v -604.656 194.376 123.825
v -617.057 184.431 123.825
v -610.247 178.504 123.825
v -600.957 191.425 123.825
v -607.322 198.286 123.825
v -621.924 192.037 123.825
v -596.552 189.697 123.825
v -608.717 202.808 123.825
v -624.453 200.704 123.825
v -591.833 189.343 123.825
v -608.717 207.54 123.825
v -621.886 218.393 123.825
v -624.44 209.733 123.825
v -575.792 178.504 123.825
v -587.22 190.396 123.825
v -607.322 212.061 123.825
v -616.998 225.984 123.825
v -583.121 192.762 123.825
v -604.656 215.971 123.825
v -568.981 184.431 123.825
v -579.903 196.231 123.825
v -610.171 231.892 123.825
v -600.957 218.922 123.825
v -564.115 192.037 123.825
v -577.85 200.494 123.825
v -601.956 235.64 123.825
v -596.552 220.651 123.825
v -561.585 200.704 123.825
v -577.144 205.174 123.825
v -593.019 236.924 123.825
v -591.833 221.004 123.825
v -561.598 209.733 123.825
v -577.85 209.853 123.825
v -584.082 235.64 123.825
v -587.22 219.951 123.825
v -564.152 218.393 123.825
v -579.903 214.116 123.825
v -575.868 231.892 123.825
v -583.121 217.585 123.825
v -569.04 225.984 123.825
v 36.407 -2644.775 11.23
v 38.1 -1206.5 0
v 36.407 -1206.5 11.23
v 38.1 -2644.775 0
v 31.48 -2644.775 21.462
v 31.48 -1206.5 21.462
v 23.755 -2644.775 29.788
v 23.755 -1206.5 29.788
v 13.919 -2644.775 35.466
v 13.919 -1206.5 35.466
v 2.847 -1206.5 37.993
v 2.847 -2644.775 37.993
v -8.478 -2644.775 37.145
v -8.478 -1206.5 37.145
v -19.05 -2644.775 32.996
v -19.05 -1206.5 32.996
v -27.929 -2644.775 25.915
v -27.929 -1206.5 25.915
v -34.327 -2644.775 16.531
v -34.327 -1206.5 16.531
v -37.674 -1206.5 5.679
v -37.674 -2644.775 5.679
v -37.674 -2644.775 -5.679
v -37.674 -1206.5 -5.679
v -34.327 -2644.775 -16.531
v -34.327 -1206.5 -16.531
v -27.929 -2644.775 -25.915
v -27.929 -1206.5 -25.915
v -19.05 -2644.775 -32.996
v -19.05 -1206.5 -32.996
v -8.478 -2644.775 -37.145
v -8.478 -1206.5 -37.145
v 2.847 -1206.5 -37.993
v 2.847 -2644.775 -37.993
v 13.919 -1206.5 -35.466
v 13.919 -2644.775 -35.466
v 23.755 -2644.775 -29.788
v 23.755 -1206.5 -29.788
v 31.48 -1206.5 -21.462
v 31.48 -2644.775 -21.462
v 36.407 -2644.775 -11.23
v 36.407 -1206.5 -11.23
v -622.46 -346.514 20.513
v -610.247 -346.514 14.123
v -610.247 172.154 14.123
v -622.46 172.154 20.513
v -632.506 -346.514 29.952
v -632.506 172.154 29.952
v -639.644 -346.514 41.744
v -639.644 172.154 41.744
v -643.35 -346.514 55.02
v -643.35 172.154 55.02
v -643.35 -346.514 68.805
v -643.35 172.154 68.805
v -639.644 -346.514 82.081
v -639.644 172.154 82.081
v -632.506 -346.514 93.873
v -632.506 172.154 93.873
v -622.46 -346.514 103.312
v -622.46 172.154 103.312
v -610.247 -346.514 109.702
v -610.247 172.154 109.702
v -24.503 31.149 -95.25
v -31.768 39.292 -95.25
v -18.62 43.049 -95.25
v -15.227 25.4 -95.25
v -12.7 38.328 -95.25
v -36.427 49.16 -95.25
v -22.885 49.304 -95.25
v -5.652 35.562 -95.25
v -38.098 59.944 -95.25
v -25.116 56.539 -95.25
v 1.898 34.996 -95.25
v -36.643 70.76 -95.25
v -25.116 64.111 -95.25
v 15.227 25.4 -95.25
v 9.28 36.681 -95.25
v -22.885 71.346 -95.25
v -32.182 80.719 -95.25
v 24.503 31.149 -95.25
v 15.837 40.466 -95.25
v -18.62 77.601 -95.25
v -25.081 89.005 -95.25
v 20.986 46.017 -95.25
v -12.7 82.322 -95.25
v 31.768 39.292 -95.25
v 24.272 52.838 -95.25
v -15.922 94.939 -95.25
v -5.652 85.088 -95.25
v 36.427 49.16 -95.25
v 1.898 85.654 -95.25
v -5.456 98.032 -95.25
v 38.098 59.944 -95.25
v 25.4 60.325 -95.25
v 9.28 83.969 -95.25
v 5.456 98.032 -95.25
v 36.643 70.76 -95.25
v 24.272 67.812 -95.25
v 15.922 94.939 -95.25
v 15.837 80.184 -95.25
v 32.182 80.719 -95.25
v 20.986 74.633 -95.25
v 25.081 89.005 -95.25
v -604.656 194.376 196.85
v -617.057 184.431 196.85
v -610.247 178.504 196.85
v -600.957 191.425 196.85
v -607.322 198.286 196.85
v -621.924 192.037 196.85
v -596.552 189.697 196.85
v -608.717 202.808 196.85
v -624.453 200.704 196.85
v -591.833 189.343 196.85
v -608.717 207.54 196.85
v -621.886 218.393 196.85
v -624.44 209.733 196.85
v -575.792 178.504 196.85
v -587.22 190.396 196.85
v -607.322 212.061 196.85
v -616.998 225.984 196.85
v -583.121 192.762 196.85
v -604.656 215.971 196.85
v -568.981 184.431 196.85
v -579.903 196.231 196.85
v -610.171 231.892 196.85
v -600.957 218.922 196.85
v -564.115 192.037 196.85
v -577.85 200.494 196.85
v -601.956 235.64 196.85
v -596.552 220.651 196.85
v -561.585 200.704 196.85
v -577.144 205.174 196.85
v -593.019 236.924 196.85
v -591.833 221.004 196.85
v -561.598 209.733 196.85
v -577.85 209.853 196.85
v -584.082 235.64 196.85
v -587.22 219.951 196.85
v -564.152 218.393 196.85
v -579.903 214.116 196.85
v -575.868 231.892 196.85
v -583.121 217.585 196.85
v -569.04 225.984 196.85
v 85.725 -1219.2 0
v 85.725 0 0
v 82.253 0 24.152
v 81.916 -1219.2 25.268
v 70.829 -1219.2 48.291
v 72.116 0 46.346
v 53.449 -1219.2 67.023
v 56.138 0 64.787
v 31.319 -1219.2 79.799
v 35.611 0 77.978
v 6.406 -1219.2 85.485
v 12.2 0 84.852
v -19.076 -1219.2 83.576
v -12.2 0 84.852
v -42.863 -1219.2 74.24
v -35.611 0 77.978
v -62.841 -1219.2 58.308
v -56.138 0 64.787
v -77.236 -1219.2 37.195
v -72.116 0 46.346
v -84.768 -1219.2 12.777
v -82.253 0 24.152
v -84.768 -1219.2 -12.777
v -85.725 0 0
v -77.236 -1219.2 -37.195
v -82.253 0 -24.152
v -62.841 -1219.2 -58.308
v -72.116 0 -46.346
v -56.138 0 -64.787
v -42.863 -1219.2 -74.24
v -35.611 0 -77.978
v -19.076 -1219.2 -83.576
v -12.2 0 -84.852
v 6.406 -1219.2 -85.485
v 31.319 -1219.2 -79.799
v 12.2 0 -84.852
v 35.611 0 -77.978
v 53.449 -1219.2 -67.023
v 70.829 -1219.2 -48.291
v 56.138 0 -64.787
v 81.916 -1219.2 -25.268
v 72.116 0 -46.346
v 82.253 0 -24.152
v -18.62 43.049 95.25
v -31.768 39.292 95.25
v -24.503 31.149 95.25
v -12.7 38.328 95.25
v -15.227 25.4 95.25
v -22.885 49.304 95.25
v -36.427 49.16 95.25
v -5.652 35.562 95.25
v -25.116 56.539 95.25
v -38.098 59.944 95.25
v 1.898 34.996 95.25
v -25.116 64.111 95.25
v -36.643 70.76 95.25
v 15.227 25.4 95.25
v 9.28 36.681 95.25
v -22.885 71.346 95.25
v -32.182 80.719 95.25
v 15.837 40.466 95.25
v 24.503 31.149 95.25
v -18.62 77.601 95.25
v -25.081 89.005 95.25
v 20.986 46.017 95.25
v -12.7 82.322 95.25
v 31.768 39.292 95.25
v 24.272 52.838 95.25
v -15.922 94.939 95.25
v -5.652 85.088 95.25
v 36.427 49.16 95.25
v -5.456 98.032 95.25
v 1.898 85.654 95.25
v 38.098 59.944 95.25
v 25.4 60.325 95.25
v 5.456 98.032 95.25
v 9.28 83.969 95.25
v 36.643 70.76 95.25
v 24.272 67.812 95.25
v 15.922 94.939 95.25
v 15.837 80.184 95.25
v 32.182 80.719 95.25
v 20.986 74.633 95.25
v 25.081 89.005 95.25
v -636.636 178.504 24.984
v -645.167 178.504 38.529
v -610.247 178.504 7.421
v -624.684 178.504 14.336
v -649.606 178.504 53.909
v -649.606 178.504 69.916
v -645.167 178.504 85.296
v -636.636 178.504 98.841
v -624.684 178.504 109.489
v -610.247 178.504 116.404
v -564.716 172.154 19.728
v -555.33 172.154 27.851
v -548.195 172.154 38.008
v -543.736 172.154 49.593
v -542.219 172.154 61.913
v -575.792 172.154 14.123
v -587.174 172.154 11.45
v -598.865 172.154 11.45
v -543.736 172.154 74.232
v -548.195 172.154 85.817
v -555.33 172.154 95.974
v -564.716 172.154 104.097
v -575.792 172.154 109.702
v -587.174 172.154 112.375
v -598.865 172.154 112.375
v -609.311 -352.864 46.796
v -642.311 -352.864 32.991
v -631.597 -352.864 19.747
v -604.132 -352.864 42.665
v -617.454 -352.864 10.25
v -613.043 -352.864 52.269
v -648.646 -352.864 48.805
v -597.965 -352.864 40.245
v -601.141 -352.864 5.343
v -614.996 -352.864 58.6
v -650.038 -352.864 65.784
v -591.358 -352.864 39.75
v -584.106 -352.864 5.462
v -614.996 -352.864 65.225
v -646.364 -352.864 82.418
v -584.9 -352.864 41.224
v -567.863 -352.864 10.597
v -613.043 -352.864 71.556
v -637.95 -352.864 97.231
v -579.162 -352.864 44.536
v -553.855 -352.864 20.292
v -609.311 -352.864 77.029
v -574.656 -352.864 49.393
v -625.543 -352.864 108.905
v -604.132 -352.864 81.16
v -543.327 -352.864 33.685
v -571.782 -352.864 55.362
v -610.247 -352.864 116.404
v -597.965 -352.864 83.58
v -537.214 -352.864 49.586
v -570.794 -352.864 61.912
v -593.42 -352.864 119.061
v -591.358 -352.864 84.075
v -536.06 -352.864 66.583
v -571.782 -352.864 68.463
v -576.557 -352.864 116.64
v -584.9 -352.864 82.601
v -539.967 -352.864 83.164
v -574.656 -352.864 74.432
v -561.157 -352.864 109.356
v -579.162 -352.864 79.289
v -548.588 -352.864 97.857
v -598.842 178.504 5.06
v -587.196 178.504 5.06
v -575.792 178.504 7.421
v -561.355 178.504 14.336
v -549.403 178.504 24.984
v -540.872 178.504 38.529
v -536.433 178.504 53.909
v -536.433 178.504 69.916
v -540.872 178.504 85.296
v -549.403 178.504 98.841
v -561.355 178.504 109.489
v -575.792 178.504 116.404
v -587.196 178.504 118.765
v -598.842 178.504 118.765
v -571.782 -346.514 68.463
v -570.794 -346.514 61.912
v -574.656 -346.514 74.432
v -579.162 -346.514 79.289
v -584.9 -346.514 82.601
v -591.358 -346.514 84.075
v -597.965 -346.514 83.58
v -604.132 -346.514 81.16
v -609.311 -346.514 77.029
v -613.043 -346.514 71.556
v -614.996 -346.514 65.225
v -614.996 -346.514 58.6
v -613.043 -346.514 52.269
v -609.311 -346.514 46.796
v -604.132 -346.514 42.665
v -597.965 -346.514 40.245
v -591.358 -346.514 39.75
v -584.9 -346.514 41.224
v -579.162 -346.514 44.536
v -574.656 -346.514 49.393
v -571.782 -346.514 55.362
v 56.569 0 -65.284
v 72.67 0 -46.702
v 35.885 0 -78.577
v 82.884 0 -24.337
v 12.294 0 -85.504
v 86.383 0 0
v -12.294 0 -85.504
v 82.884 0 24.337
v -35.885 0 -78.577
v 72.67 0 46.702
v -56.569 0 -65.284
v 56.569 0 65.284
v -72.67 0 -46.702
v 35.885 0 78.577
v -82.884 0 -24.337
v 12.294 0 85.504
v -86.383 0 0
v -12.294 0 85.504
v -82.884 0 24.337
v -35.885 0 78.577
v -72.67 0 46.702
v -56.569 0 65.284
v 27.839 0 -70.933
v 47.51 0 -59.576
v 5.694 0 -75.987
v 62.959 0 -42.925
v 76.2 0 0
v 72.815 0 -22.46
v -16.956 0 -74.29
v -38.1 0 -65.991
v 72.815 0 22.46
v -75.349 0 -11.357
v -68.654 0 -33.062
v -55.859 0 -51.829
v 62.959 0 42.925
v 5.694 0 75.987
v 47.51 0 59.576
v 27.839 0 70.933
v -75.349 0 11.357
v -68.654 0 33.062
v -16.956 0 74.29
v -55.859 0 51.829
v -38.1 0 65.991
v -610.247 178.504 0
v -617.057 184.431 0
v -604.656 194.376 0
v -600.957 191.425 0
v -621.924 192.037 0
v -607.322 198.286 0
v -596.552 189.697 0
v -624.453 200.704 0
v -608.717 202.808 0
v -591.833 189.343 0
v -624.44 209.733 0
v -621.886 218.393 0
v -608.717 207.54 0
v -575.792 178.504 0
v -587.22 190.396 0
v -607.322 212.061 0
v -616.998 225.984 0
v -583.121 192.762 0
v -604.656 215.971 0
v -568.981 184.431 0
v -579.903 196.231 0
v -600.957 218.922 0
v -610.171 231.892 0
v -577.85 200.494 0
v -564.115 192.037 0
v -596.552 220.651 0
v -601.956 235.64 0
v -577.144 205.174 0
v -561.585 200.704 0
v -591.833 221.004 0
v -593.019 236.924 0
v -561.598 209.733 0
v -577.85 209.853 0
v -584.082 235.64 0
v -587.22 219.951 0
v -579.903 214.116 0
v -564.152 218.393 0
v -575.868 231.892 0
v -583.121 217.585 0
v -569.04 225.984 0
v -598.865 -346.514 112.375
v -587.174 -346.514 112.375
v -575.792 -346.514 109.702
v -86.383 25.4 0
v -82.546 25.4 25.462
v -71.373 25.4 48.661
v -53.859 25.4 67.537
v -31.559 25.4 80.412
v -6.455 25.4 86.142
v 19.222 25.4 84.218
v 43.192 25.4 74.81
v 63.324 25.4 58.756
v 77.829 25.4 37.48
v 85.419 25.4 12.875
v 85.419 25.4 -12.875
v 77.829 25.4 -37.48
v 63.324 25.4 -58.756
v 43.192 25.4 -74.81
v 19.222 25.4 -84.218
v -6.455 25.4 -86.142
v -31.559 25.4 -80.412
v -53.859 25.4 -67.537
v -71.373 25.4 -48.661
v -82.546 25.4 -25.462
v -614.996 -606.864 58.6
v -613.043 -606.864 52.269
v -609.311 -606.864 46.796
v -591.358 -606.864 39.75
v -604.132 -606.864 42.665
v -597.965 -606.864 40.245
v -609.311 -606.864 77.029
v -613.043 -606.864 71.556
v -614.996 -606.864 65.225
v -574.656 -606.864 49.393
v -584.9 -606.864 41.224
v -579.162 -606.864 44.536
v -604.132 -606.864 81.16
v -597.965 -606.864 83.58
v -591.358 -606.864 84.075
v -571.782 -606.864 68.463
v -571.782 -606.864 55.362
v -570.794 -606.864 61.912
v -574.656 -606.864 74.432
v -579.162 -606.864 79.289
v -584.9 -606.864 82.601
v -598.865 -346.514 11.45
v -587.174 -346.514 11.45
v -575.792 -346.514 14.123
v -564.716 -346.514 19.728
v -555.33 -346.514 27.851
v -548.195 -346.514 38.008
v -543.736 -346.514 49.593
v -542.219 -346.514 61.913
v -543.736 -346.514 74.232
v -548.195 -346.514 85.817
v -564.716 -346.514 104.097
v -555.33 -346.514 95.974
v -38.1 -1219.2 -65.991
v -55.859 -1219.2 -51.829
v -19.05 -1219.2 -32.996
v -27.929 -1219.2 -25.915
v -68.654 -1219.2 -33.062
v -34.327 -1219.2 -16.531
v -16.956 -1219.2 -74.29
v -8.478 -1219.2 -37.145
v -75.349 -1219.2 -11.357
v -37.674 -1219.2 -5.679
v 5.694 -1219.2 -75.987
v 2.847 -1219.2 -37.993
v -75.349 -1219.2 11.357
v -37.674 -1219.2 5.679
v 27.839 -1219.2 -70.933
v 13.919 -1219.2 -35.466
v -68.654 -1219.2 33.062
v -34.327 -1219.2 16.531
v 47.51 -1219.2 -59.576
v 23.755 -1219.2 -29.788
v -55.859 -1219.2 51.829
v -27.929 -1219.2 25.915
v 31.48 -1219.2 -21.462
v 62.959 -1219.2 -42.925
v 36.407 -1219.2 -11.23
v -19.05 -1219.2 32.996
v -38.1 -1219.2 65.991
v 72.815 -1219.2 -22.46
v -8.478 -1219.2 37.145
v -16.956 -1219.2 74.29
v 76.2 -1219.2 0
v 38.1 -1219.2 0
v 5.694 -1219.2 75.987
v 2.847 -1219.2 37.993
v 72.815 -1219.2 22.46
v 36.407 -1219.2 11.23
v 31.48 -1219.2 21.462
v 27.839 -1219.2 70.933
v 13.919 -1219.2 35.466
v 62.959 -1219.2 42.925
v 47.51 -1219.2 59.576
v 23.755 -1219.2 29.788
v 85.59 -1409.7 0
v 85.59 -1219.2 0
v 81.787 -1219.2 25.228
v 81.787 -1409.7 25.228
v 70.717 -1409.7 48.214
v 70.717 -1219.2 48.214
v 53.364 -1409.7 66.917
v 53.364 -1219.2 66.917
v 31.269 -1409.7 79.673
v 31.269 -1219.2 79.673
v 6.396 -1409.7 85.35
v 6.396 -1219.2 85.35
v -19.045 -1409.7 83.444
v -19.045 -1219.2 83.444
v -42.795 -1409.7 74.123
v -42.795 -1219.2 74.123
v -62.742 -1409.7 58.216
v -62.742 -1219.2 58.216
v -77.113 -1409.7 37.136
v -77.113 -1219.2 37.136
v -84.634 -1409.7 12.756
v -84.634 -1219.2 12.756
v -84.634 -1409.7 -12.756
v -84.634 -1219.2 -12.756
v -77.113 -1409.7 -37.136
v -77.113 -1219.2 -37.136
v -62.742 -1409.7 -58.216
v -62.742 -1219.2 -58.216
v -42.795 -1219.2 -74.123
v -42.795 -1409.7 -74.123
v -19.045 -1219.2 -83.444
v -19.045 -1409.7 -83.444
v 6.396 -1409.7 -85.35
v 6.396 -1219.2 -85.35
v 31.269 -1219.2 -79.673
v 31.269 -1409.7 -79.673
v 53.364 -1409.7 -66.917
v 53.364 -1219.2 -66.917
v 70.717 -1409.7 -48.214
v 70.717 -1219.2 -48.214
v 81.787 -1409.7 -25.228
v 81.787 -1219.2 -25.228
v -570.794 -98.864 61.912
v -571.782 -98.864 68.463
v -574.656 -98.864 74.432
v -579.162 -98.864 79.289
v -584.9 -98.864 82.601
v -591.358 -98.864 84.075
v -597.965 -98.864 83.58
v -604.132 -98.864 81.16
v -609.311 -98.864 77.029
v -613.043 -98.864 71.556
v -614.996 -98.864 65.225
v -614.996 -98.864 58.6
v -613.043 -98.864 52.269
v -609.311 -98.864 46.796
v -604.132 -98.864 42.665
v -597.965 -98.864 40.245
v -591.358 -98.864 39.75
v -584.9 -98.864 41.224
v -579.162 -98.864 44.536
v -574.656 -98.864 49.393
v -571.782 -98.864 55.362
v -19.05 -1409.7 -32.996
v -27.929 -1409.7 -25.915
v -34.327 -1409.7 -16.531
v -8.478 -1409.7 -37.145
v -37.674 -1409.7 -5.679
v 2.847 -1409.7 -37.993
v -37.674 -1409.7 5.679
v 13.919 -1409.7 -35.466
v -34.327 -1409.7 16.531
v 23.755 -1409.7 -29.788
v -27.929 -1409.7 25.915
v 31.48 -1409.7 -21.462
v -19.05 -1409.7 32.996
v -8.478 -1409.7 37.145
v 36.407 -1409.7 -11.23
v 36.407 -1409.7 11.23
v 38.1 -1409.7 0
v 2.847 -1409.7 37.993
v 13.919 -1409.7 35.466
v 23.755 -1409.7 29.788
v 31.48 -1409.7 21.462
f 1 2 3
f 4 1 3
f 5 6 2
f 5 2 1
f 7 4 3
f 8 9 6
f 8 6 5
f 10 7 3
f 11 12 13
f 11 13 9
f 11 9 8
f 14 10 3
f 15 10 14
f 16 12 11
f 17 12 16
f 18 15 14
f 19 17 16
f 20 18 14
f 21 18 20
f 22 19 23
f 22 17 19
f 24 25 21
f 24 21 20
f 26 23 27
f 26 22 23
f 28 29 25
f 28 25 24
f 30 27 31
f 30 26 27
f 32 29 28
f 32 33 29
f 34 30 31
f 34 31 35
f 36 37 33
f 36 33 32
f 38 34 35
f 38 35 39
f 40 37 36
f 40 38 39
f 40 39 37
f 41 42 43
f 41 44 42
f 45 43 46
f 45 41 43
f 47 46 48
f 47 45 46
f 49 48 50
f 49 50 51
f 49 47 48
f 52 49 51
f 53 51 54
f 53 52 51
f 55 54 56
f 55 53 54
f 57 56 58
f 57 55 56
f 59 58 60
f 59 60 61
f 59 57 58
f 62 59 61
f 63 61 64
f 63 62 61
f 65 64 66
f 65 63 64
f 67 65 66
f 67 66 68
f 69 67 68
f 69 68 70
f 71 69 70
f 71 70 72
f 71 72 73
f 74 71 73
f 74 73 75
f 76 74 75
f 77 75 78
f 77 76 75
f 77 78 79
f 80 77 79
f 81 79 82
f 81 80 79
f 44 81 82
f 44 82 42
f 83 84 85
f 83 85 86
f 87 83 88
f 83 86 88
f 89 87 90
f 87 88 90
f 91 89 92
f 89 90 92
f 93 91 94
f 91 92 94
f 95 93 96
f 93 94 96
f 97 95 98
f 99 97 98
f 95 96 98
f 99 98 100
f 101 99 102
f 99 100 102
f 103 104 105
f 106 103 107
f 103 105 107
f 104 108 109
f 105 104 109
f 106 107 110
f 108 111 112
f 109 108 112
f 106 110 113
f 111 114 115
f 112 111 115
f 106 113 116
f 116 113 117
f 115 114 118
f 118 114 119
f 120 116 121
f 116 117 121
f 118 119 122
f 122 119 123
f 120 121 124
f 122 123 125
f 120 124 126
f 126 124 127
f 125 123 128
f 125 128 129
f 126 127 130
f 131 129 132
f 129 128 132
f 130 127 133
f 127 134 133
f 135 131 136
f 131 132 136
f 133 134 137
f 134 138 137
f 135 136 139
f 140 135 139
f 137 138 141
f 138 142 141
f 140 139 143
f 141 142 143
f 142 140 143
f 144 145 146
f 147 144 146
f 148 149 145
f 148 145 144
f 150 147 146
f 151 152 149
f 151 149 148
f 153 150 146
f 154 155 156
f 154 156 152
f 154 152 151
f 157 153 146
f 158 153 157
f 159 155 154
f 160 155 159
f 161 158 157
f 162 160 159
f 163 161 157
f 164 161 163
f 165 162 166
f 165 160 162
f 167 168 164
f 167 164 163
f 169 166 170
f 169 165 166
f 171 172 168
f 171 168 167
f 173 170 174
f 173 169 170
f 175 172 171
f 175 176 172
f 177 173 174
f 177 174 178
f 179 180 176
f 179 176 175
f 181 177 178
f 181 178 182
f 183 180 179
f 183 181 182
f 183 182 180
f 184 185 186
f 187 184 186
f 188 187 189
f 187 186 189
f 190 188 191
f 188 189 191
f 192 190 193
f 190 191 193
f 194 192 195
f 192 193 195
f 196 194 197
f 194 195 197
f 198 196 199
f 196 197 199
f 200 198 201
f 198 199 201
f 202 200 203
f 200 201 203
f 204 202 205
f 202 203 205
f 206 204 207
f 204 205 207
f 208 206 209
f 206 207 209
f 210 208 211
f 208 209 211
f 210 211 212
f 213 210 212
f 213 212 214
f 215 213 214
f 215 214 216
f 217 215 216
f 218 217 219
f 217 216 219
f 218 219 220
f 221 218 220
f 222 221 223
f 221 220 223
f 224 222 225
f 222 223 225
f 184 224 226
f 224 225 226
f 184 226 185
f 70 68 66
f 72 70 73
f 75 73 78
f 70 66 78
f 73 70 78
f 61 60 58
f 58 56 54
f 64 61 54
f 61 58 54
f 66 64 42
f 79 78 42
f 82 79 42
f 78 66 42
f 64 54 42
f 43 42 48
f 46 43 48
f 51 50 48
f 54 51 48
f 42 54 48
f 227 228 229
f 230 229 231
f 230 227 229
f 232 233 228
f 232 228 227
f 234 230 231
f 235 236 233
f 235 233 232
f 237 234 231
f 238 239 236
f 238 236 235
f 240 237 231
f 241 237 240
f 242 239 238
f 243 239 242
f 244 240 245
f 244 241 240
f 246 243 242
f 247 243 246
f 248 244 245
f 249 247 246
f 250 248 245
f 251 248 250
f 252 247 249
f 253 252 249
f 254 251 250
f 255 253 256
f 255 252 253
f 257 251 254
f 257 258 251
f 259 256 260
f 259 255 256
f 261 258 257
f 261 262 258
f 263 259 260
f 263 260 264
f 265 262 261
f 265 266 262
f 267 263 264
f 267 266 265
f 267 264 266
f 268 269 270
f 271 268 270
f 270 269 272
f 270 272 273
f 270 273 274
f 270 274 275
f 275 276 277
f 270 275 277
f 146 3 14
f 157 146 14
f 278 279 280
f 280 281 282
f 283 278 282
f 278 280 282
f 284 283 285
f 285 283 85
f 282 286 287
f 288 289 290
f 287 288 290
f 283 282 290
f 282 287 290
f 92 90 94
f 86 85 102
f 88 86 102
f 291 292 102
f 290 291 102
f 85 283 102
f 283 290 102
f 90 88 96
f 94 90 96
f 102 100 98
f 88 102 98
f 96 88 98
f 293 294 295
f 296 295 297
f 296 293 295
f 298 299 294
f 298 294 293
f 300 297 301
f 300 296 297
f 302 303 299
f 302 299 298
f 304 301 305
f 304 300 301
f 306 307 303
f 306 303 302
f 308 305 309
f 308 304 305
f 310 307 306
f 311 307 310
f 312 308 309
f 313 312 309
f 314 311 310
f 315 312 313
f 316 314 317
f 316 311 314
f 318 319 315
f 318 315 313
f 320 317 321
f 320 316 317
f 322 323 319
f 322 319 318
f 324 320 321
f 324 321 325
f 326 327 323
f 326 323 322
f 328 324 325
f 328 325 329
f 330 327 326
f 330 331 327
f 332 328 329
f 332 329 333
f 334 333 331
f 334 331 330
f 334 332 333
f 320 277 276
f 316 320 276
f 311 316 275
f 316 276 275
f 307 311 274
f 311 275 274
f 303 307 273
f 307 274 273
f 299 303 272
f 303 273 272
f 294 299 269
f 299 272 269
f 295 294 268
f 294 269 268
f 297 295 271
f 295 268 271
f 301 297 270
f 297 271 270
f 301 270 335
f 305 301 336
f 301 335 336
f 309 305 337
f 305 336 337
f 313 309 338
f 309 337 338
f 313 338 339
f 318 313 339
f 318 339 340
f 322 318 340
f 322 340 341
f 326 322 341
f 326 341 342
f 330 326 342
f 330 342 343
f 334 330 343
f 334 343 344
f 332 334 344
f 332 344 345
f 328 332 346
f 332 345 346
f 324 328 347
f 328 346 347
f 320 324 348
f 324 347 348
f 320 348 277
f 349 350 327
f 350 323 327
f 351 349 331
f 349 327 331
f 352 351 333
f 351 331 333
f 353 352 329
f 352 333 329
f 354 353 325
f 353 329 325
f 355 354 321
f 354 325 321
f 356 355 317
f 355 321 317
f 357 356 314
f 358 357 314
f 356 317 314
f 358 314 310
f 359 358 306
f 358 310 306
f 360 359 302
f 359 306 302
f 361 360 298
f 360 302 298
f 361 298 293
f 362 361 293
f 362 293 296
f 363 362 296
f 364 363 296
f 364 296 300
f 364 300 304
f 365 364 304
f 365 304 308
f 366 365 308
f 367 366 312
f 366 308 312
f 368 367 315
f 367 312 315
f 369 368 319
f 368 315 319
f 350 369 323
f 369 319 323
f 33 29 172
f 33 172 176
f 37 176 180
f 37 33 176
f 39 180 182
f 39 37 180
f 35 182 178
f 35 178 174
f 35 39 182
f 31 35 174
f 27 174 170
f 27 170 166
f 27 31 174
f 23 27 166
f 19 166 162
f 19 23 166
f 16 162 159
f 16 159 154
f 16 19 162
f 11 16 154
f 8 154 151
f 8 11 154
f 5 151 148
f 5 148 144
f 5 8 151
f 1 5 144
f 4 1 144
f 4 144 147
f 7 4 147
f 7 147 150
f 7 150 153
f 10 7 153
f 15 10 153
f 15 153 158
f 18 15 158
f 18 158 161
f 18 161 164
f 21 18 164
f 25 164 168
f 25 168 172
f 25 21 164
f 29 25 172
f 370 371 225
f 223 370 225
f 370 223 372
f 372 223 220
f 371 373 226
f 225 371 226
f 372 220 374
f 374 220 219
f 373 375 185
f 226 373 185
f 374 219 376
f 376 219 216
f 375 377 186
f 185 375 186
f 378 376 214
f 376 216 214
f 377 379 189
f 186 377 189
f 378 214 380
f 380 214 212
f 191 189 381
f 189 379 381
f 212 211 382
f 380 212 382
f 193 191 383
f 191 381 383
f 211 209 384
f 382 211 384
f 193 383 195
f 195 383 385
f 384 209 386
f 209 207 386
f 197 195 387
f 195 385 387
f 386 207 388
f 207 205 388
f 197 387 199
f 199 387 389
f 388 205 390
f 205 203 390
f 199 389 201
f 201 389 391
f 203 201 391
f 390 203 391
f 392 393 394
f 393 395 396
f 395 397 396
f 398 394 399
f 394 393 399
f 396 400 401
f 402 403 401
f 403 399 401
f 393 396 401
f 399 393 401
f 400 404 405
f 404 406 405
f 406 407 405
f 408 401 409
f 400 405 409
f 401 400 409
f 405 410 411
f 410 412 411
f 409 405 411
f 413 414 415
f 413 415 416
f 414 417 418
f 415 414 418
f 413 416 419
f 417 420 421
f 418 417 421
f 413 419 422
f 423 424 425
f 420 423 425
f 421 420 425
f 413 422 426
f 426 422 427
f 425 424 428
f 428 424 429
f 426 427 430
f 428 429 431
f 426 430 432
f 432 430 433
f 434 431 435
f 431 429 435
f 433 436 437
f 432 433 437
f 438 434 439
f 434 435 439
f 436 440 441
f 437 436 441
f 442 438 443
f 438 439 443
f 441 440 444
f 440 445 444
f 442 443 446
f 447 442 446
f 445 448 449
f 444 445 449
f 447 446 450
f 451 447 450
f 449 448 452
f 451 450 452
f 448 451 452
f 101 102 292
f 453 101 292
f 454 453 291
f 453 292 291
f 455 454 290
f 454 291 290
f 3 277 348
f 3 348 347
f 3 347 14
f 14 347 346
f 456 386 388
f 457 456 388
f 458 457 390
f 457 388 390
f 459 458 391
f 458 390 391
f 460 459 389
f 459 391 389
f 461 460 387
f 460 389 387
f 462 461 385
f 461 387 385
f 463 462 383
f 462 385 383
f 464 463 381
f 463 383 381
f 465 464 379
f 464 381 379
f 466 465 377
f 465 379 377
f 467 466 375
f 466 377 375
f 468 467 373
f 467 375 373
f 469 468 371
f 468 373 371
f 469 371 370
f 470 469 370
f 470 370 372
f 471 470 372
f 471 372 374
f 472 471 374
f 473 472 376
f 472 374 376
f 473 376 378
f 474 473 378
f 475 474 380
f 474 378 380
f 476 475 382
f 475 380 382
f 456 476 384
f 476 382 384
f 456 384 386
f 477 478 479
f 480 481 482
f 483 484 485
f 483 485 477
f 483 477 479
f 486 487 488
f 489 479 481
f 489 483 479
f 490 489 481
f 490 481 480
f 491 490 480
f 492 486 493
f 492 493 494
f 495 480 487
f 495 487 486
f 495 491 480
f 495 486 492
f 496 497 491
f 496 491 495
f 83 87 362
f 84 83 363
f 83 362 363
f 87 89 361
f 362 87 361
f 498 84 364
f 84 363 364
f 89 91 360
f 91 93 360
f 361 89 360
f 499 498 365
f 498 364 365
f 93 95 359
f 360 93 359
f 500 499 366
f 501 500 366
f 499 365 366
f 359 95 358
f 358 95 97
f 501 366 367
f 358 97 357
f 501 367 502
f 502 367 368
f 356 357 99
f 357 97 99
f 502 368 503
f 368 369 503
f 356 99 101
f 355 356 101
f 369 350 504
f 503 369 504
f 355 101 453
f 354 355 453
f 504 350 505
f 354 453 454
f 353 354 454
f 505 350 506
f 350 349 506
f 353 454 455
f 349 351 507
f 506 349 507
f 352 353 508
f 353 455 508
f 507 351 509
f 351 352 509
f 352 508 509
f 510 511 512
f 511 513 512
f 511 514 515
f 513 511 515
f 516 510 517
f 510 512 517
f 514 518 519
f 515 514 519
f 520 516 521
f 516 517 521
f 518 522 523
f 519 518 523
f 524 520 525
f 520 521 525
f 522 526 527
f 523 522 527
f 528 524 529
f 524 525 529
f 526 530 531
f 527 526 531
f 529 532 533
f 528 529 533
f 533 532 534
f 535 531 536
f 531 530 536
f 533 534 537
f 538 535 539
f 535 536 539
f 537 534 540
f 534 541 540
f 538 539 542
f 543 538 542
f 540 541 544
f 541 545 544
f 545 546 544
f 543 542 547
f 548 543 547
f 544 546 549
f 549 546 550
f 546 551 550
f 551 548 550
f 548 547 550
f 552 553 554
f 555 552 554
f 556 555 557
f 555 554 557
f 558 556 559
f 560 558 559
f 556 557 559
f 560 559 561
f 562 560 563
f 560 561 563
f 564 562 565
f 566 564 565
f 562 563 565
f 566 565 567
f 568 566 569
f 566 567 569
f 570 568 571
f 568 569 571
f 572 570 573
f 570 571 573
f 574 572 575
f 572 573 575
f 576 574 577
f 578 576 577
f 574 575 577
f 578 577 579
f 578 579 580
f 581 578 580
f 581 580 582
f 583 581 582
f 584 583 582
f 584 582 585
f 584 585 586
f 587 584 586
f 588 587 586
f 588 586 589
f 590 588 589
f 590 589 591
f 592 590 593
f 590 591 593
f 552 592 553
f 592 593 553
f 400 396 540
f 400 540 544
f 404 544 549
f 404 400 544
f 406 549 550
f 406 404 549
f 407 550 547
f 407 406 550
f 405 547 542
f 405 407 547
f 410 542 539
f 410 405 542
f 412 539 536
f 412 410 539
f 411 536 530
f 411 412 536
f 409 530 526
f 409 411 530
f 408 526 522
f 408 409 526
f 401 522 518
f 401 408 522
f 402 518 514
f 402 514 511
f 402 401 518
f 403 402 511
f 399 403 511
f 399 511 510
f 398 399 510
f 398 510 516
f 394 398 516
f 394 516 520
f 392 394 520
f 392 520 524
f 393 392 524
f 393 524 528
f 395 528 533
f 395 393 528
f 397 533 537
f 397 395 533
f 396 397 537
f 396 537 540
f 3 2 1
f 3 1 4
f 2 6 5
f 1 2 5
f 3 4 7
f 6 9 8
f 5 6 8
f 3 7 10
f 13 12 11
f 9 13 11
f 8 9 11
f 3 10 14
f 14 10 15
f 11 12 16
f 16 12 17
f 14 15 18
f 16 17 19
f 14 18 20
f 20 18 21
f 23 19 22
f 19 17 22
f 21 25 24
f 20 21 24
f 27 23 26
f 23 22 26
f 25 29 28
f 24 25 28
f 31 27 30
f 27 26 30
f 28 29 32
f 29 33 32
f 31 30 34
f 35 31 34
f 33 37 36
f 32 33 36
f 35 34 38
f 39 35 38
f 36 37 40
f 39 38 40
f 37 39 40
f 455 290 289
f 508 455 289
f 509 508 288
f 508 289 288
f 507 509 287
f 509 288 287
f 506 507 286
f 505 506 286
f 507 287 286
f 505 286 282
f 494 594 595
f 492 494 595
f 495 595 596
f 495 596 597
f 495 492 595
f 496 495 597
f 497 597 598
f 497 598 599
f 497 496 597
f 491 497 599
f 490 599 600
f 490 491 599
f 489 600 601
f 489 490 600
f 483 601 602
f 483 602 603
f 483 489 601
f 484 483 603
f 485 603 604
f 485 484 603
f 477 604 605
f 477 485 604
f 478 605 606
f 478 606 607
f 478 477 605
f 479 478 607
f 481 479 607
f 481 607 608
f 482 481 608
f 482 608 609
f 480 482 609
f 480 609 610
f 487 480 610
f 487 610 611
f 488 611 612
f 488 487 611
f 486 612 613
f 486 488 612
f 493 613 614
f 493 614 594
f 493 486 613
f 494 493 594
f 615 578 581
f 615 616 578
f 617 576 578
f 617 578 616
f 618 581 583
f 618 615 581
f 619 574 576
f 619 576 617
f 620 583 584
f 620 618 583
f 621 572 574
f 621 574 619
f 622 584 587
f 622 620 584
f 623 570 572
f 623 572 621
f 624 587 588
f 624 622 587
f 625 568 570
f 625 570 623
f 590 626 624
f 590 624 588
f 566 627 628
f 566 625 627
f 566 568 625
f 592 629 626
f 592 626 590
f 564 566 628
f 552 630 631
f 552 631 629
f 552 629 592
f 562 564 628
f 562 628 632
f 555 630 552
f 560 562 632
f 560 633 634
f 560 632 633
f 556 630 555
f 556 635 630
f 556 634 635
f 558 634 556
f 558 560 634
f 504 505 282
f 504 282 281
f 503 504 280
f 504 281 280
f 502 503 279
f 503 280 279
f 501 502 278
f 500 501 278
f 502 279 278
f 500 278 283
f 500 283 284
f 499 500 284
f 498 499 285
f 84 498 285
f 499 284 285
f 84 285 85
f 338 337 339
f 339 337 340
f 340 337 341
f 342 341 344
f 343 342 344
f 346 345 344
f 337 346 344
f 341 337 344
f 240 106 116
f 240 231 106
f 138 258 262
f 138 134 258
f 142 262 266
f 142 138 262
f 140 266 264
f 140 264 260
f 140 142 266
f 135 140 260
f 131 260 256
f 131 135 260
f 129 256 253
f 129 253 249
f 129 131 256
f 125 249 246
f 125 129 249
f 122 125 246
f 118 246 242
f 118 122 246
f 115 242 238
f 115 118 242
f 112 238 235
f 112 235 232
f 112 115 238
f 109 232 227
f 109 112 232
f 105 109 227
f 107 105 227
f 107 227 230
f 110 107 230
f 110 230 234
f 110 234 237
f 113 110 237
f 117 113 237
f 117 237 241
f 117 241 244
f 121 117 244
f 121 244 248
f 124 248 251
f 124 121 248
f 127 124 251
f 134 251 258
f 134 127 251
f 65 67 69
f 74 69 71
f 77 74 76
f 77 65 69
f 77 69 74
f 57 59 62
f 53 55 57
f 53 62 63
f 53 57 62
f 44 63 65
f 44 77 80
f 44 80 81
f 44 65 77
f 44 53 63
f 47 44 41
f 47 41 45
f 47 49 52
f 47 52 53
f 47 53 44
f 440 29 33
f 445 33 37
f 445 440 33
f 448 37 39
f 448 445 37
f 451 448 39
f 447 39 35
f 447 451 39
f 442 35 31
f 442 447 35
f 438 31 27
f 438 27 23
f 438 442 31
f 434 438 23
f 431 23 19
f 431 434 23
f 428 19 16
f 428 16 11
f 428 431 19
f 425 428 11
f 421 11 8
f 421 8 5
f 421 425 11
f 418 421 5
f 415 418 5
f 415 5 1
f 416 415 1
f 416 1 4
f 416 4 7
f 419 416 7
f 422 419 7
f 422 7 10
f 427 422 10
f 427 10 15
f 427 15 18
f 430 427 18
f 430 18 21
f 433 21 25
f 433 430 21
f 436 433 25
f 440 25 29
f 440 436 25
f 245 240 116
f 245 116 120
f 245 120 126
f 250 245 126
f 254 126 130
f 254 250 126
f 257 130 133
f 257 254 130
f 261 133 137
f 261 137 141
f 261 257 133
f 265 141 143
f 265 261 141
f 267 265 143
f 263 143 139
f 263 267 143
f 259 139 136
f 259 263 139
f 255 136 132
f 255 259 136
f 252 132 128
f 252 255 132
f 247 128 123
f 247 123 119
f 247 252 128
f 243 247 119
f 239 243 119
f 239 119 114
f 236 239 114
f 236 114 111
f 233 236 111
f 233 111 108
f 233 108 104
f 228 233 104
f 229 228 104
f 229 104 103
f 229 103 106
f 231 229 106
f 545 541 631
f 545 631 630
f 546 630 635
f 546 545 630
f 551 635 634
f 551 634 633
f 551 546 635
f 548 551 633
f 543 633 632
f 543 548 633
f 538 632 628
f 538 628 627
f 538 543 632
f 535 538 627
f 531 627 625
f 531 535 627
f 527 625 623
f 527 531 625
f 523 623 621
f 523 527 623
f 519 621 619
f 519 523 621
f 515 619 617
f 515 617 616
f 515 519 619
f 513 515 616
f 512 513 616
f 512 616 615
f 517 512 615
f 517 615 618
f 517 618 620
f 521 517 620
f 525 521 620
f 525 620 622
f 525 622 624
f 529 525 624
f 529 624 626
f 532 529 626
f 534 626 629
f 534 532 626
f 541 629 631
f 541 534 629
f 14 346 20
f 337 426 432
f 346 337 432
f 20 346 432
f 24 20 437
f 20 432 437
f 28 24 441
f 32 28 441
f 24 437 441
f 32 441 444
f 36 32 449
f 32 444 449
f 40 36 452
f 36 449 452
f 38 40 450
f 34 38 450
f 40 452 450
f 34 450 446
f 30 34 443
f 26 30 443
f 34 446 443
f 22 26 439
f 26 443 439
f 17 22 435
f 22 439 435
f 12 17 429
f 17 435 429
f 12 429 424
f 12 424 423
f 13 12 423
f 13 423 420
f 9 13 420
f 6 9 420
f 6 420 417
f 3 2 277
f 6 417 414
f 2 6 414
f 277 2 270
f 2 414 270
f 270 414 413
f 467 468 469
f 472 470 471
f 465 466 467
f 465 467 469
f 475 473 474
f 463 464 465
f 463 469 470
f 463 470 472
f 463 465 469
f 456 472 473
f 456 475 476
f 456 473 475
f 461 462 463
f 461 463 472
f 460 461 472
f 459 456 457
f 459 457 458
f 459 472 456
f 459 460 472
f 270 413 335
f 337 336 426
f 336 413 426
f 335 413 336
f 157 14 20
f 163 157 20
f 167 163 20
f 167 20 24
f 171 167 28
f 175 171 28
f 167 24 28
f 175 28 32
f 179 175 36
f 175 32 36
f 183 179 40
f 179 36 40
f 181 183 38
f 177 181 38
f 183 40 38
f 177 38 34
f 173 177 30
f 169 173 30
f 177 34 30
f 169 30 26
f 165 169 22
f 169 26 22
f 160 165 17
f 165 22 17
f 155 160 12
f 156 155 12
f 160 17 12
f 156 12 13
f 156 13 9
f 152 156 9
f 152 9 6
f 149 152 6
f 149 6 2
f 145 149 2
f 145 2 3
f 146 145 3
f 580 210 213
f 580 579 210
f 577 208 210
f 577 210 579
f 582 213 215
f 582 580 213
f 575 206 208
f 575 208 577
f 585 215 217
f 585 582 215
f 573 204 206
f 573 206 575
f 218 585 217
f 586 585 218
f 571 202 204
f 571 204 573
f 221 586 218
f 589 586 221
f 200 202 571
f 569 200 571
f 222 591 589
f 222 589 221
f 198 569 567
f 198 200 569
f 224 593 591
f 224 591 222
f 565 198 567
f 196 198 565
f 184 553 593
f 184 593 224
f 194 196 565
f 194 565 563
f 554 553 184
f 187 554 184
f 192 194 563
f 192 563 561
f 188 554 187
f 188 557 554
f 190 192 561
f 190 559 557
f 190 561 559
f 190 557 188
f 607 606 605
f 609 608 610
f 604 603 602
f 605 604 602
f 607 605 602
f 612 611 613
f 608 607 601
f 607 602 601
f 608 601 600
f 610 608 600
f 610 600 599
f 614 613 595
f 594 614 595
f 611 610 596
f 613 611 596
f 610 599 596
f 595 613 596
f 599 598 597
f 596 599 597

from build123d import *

# Parameters (mm, degrees)
F0_R          = 85.725
F0_R_2        = 76.2
F1_DEPTH      = 1219.2
F2_R          = 85.5895184233
F2_R_2        = 76.2
F2_R_3        = 38.1
F3_DEPTH      = 190.5
F4_R          = 86.3833911662
F4_R_2        = 85.725
F4_R_3        = 76.2
F5_DEPTH      = 25.4
F6_R          = 25.4
F7_DEPTH      = 95.25
F8_R          = 38.1
F9_DEPTH      = 1235.075
F9_DEPTH_BACK = 203.2
F16_R         = 15.875
F17_DEPTH     = 123.825
F18_DEPTH     = 73.025
F20_DEPTH     = 531.368
F21_R         = 57.15
F22_DEPTH     = 6.35
F23_R         = 56.7654297604
F24_DEPTH     = 6.35
F25_R         = 22.225
F26_DEPTH     = 254


with BuildPart() as f1:
    # F0 (on Front) → F1 (new body)
    with BuildSketch(Plane.XZ):
        Circle(F0_R)
        Circle(F0_R_2, mode=Mode.SUBTRACT)
    extrude(amount=F1_DEPTH)

    # F2 (on face) → F3 (join)
    with BuildSketch(Plane.XZ.offset(1219.2)):
        Circle(F2_R)
        Circle(F2_R_2, mode=Mode.SUBTRACT)
        Circle(F2_R_2)
        Circle(F2_R_3, mode=Mode.SUBTRACT)
    extrude(amount=F3_DEPTH)

    # F4 (on face) → F5 (join)
    with BuildSketch(Plane(origin=(0, 0, 0), x_dir=(-1, 0, 0), z_dir=(0, 1, 0))):
        Circle(F4_R)
        Circle(F4_R_2, mode=Mode.SUBTRACT)
        Circle(F4_R_2)
        Circle(F4_R_3, mode=Mode.SUBTRACT)
        Circle(F4_R_3)
    extrude(amount=F5_DEPTH)


with BuildPart() as f7:
    # F6 (on Top) → F7 (new body, symmetric)
    with BuildSketch(Plane.XY):
        with BuildLine():
            Line((-15.2267650865, 25.4), (15.2267650865, 25.4))
            ThreePointArc((15.2267650865, 25.4), (0, 98.425), (-15.2267650865, 25.4))
        make_face()
        with Locations((0, 60.325)):
            Circle(F6_R, mode=Mode.SUBTRACT)
    extrude(amount=F7_DEPTH, both=True)


with BuildPart() as f9:
    # F8 (on face) → F9 (new body, two sides)
    with BuildSketch(Plane.XZ.offset(1409.7)) as f9_sk:
        Circle(F8_R)
    extrude(amount=F9_DEPTH)
    extrude(f9_sk.sketch, amount=-F9_DEPTH_BACK)


with BuildPart() as f10_1:
    # F10: copy of F1
    add(f1.part.moved(Location((-444.5, 0, 0))))


with BuildPart() as f11_1:
    # F11: copy of F7
    add(f7.part.moved(Location((-347.98, 0, 0))))


with BuildPart() as f12_1:
    # F12: copy of F9
    add(f9.part.moved(Location((-424.18, 0, 0))))


with BuildPart() as f17:
    # F16 (on Top) → F17 (new body)
    with BuildSketch(Plane.XY):
        with BuildLine():
            Line((-610.2468481452, 178.5038380514), (-575.7917527592, 178.5038380514))
            ThreePointArc((-575.7917527592, 178.5038380514), (-593.0193004522, 236.9235605938), (-610.2468481452, 178.5038380514))
        make_face()
        with Locations((-593.0193004522, 205.1735605938)):
            Circle(F16_R, mode=Mode.SUBTRACT)
    extrude(amount=F17_DEPTH)


with BuildPart() as f18:
    # F18 (new): a face of the model
    f18_faces = [f17.part.faces().sort_by_distance(p)[0] for p in [
        (-593.0193004522, 179.3666887907, 123.825),
    ]]
    extrude(f18_faces, amount=F18_DEPTH)


with BuildPart() as f20:
    # F19 (on face) → F20 (new body)
    with BuildSketch(Plane.XZ.offset(-178.5038380514)):
        with BuildLine():
            ThreePointArc((-575.7917527592, 7.4209033957), (-546.9179075738, 28.1370048197), (-535.8693004522, 61.9125))
            ThreePointArc((-535.8693004522, 61.9125), (-546.9179075738, 95.6879951803), (-575.7917527592, 116.4040966043))
            Line((-575.7917527592, 116.4040966043), (-575.7917527592, 109.7021302809))
            ThreePointArc((-575.7917527592, 109.7021302809), (-551.4513073356, 91.1141970426), (-542.2193283862, 61.9125))
            ThreePointArc((-542.2193283862, 61.9125), (-551.4513073356, 32.7108029574), (-575.7917527592, 14.1228697191))
            Line((-575.7917527592, 14.1228697191), (-575.7917527592, 7.4209033957))
        make_face()
        with BuildLine():
            Line((-575.7917527592, 109.7021302809), (-575.7917527592, 116.4040966043))
            ThreePointArc((-575.7917527592, 116.4040966043), (-593.0193004522, 119.0625), (-610.2468481452, 116.4040966043))
            Line((-610.2468481452, 116.4040966043), (-610.2468481452, 109.7021302809))
            ThreePointArc((-610.2468481452, 109.7021302809), (-593.0193004522, 112.712472066), (-575.7917527592, 109.7021302809))
        make_face()
        with BuildLine():
            ThreePointArc((-610.2468481452, 7.4209033957), (-593.0193004522, 4.7625), (-575.7917527592, 7.4209033957))
            Line((-575.7917527592, 7.4209033957), (-575.7917527592, 14.1228697191))
            ThreePointArc((-575.7917527592, 14.1228697191), (-593.0193004522, 11.112527934), (-610.2468481452, 14.1228697191))
            Line((-610.2468481452, 14.1228697191), (-610.2468481452, 7.4209033957))
        make_face()
        with BuildLine():
            Line((-610.2468481452, 109.7021302809), (-610.2468481452, 116.4040966043))
            ThreePointArc((-610.2468481452, 116.4040966043), (-650.1693004522, 61.9125), (-610.2468481452, 7.4209033957))
            Line((-610.2468481452, 7.4209033957), (-610.2468481452, 14.1228697191))
            ThreePointArc((-610.2468481452, 14.1228697191), (-643.8192725182, 61.9125), (-610.2468481452, 109.7021302809))
        make_face()
    extrude(amount=F20_DEPTH)


with BuildPart() as f17_1:
    add(f17.part)

    add(f20.part)  # F22 merges F20
    # F21 (on face) → F22 (join)
    with BuildSketch(Plane(origin=(0, 178.5038380514, 0), x_dir=(-1, 0, 0), z_dir=(0, 1, 0))):
        with Locations((593.0193004522, 61.9125)):
            Circle(F21_R)
    extrude(amount=-F22_DEPTH)

    # F23 (on face) → F24 (join)
    with BuildSketch(Plane.XZ.offset(352.8641619486)):
        with Locations((-593.0193004522, 61.9125)):
            Circle(F23_R)
    extrude(amount=-F24_DEPTH)


with BuildPart() as f26:
    # F25 (on face) → F26 (new body, symmetric)
    with BuildSketch(Plane.XZ.offset(352.8641619486)):
        with Locations((-593.0193004522, 61.9125)):
            Circle(F25_R)
    extrude(amount=F26_DEPTH, both=True)


with BuildPart() as f17_2:
    add(f17_1.part)

    # F27: cut F26
    add(f26.part, mode=Mode.SUBTRACT)


solid = Compound([f1.part, f7.part, f9.part, f18.part, f26.part, f17_2.part])
